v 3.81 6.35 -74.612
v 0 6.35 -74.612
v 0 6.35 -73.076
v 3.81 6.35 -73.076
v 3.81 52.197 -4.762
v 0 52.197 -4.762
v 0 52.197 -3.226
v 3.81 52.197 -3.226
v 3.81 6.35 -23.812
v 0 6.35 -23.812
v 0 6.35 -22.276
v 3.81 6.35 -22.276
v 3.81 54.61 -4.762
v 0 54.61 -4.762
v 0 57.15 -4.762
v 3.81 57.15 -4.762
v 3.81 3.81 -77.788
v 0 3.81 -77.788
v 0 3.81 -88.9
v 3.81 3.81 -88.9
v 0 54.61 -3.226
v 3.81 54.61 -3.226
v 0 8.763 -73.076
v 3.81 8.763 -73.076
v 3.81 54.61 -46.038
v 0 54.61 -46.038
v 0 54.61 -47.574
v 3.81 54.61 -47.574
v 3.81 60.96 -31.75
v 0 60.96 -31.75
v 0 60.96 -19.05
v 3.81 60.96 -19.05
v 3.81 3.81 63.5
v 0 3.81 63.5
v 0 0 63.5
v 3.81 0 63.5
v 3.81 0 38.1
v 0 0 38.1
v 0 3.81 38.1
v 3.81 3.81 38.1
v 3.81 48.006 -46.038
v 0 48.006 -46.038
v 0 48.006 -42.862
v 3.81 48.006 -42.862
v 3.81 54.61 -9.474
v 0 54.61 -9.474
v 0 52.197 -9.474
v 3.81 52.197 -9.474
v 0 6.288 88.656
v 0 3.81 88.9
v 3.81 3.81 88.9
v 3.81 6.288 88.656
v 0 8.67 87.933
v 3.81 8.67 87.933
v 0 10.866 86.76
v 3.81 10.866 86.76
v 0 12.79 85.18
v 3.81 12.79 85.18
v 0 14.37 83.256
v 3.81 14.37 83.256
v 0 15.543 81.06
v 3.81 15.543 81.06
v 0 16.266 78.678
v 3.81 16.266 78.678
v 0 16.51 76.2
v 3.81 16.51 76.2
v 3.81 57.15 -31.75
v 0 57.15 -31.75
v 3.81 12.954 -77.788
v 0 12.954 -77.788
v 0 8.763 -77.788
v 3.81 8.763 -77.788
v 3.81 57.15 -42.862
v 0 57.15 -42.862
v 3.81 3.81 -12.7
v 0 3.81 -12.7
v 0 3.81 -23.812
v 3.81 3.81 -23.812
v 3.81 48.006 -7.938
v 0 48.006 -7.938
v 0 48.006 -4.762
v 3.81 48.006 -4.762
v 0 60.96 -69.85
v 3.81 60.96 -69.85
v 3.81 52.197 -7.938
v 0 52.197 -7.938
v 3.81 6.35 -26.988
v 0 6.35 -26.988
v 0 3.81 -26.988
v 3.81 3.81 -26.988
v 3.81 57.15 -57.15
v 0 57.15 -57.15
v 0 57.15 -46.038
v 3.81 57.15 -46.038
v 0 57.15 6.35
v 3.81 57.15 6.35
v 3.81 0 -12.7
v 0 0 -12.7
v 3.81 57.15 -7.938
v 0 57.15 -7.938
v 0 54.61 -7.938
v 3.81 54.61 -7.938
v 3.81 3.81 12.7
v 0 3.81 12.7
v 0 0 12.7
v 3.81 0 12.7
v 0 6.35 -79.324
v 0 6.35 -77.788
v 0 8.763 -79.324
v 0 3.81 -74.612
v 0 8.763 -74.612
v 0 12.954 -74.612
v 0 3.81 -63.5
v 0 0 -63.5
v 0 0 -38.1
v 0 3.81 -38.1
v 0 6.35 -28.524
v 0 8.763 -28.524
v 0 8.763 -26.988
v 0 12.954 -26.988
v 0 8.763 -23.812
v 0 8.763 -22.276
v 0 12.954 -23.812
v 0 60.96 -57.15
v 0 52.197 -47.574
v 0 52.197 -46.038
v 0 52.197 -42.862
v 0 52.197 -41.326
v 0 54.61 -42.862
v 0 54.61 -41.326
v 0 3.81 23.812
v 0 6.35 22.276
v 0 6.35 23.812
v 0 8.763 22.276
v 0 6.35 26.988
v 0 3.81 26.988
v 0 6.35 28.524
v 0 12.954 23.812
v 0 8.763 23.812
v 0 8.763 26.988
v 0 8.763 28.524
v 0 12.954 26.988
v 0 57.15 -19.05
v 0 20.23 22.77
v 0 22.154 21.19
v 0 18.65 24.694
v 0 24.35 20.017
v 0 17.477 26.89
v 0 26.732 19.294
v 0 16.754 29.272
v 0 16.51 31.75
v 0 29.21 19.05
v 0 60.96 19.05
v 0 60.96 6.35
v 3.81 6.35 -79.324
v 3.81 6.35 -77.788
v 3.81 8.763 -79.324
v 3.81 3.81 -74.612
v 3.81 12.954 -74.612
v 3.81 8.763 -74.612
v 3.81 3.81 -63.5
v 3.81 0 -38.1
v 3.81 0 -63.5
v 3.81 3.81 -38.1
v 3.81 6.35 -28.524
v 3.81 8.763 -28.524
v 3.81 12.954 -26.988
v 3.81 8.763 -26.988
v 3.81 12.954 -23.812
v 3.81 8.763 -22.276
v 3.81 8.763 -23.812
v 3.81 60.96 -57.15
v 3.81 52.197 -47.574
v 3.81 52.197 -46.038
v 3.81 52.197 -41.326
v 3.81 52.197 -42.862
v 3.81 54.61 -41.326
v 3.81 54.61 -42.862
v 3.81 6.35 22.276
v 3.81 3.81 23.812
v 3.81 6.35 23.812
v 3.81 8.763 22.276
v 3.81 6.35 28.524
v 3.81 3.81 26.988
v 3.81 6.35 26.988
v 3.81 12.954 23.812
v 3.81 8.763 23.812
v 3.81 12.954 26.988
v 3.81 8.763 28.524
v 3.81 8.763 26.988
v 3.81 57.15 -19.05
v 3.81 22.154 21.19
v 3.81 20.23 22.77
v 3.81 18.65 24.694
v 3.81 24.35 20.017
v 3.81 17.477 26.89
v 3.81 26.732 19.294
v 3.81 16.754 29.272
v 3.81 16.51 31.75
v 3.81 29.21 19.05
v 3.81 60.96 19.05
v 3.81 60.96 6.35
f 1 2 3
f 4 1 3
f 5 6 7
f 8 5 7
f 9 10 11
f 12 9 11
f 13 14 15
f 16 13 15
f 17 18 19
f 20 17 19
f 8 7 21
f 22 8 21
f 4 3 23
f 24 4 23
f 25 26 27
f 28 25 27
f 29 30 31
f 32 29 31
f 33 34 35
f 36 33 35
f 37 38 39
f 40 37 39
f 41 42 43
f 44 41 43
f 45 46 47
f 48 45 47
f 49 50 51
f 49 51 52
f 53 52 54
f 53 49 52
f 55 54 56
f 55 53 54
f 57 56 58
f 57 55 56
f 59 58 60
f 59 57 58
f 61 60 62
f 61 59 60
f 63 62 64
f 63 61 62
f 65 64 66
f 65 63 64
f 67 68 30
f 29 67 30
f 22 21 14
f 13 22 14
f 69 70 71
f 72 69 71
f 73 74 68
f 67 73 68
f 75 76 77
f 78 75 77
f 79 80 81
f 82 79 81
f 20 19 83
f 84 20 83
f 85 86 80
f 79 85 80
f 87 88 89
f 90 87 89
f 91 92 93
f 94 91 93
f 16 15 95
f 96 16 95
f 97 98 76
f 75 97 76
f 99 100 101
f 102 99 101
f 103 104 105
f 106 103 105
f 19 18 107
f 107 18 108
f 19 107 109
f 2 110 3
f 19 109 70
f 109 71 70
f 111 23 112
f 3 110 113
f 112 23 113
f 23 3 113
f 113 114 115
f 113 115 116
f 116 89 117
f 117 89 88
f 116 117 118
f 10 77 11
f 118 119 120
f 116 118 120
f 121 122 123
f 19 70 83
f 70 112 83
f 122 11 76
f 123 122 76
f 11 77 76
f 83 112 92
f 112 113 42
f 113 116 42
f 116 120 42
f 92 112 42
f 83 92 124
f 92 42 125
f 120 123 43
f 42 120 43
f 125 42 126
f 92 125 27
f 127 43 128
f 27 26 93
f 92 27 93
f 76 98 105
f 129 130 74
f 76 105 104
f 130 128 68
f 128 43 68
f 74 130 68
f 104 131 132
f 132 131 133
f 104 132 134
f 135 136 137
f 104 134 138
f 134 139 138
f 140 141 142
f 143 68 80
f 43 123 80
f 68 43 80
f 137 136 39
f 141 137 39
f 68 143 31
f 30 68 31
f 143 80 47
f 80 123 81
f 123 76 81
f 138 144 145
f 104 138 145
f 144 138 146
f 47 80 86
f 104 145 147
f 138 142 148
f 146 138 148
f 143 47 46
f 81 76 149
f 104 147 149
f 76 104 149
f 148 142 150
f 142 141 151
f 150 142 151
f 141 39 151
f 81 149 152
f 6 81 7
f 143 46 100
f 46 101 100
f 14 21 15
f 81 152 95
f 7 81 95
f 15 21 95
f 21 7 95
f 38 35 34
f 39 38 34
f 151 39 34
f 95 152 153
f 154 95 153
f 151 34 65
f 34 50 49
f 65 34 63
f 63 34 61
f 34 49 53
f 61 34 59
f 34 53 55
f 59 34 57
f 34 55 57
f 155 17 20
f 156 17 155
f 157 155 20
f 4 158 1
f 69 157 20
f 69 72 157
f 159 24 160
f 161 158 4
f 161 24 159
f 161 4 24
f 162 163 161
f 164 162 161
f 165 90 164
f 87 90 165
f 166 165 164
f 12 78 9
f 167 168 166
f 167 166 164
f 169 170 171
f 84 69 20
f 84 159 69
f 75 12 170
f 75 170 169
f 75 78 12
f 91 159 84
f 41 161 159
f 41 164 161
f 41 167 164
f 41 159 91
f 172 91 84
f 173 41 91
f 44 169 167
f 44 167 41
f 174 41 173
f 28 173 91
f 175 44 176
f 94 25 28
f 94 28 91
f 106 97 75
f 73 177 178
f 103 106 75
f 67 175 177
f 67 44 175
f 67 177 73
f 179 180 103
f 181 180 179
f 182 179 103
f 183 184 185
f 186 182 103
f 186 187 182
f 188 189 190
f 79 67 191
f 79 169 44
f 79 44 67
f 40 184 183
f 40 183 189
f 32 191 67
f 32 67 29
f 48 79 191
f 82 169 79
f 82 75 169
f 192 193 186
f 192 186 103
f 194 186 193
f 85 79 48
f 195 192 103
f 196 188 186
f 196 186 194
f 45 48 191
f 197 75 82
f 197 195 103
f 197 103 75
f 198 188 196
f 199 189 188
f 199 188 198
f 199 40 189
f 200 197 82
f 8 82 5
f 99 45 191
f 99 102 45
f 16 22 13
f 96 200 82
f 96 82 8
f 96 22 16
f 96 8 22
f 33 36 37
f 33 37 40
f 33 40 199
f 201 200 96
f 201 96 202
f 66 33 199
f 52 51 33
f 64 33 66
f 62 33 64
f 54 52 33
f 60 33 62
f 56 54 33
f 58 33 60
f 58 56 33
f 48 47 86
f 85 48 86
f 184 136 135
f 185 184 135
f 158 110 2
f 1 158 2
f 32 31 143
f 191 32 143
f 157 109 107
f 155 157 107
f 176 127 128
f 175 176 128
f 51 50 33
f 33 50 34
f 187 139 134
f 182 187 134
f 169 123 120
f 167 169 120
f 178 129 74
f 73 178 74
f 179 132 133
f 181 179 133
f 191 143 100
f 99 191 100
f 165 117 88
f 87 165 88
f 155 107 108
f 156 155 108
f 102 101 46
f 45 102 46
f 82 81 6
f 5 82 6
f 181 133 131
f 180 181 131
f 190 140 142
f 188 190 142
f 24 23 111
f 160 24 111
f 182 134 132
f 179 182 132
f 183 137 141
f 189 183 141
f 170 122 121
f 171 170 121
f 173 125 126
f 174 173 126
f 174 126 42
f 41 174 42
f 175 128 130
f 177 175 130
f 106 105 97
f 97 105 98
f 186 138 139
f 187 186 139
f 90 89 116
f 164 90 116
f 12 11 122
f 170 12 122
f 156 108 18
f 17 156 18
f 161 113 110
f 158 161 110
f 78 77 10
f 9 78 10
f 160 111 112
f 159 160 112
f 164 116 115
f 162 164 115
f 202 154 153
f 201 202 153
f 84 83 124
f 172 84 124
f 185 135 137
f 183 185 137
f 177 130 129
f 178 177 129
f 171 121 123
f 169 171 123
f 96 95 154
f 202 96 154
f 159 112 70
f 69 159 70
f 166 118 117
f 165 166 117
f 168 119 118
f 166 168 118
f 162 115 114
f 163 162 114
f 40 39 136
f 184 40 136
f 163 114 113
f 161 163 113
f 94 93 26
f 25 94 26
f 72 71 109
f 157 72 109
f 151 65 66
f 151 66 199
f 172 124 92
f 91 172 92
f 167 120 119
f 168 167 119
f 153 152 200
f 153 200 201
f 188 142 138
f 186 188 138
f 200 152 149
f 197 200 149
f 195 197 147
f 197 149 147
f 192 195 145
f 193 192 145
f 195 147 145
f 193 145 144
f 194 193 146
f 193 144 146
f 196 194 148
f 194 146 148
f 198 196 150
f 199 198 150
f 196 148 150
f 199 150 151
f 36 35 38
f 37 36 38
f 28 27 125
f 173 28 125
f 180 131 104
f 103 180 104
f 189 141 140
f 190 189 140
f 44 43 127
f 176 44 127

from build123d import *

# Parameters (mm, degrees)
BOSS_EXTRUDE1_DEPTH     = 3.81
CUT_EXTRUDE1_DEPTH      = 108.860315687
CUT_EXTRUDE1_DEPTH_BACK = 108.860315687
FILLET3_START           = -1
FILLET3_DEPTH           = 6
FILLET3_2_DEPTH         = 3.81


with BuildPart() as part:
    # Sketch1 → Boss-Extrude1 (new body)
    with BuildSketch(Plane(origin=(0, 0, 0), x_dir=(0, 0, -1), z_dir=(1, 0, 0))):
        Polygon((-88.9, 3.81), (-63.5, 3.81), (-63.5, 0), (-38.1, 0), (-38.1, 3.81), (-26.9875, 3.81), (-26.9875, 6.35), (-28.5242, 6.35), (-28.5242, 8.763), (-26.9875, 8.763), (-26.9875, 12.954), (-23.8125, 12.954), (-23.8125, 8.763), (-22.2758, 8.763), (-22.2758, 6.35), (-23.8125, 6.35), (-23.8125, 3.81), (-12.7, 3.81), (-12.7, 0), (12.7, 0), (12.7, 3.81), (23.8125, 3.81), (23.8125, 6.35), (22.2758, 6.35), (22.2758, 8.763), (23.8125, 8.763), (23.8125, 12.954), (26.9875, 12.954), (26.9875, 8.763), (28.5242, 8.763), (28.5242, 6.35), (26.9875, 6.35), (26.9875, 3.81), (38.1, 3.81), (38.1, 0), (63.5, 0), (63.5, 3.81), (74.6125, 3.81), (74.6125, 6.35), (73.0758, 6.35), (73.0758, 8.763), (74.6125, 8.763), (74.6125, 12.954), (77.7875, 12.954), (77.7875, 8.763), (79.3242, 8.763), (79.3242, 6.35), (77.7875, 6.35), (77.7875, 3.81), (88.9, 3.81), (69.85, 60.96), (57.15, 60.96), (57.15, 57.15), (46.0375, 57.15), (46.0375, 54.61), (47.5742, 54.61), (47.5742, 52.197), (46.0375, 52.197), (46.0375, 48.006), (42.8625, 48.006), (42.8625, 52.197), (41.3258, 52.197), (41.3258, 54.61), (42.8625, 54.61), (42.8625, 57.15), (31.75, 57.15), (31.75, 60.96), (19.05, 60.96), (19.05, 57.15), (7.9375, 57.15), (7.9375, 54.61), (9.4742, 54.61), (9.4742, 52.197), (7.9375, 52.197), (7.9375, 48.006), (4.7625, 48.006), (4.7625, 52.197), (3.2258, 52.197), (3.2258, 54.61), (4.7625, 54.61), (4.7625, 57.15), (-6.35, 57.15), (-6.35, 60.96), (-19.05, 60.96), (-88.9, 16.51), align=None)
    extrude(amount=BOSS_EXTRUDE1_DEPTH)

    # Sketch2 → Cut-Extrude1 (cut, two sides: drawn at the far end of the back side and taken through both)
    with BuildSketch(Plane(origin=(0, 0, 0), x_dir=(0, 0, -1), z_dir=(1, 0, 0)).offset(-CUT_EXTRUDE1_DEPTH_BACK)):
        Polygon((-37.957173184, 48.928162519), (-88.9, 16.51), (-19.05, 16.51), (-19.05, 60.96), align=None)
    extrude(amount=CUT_EXTRUDE1_DEPTH + CUT_EXTRUDE1_DEPTH_BACK, mode=Mode.SUBTRACT)

    # Fillet3: read off the stored shape, not the designer's step
    # Fillet3 outline → Fillet3 (cut)
    with BuildSketch(Plane.YZ.offset(FILLET3_START)):
        with BuildLine():
            ThreePointArc((3.81, 88.9), (12.790256121, 85.180256121), (16.51, 76.2))
            Line((16.51, 76.2), (16.51, 88.9))
            Line((16.51, 88.9), (3.81, 88.9))
        make_face()
    extrude(amount=FILLET3_DEPTH, mode=Mode.SUBTRACT)

    # Fillet3 2 outline → Fillet3 2 (add)
    with BuildSketch(Plane.YZ):
        with BuildLine():
            ThreePointArc((29.21, 19.05), (20.229743879, 22.769743879), (16.51, 31.75))
            Line((16.51, 31.75), (16.51, 19.05))
            Line((16.51, 19.05), (29.21, 19.05))
        make_face()
    extrude(amount=FILLET3_2_DEPTH)


solid = part.part
